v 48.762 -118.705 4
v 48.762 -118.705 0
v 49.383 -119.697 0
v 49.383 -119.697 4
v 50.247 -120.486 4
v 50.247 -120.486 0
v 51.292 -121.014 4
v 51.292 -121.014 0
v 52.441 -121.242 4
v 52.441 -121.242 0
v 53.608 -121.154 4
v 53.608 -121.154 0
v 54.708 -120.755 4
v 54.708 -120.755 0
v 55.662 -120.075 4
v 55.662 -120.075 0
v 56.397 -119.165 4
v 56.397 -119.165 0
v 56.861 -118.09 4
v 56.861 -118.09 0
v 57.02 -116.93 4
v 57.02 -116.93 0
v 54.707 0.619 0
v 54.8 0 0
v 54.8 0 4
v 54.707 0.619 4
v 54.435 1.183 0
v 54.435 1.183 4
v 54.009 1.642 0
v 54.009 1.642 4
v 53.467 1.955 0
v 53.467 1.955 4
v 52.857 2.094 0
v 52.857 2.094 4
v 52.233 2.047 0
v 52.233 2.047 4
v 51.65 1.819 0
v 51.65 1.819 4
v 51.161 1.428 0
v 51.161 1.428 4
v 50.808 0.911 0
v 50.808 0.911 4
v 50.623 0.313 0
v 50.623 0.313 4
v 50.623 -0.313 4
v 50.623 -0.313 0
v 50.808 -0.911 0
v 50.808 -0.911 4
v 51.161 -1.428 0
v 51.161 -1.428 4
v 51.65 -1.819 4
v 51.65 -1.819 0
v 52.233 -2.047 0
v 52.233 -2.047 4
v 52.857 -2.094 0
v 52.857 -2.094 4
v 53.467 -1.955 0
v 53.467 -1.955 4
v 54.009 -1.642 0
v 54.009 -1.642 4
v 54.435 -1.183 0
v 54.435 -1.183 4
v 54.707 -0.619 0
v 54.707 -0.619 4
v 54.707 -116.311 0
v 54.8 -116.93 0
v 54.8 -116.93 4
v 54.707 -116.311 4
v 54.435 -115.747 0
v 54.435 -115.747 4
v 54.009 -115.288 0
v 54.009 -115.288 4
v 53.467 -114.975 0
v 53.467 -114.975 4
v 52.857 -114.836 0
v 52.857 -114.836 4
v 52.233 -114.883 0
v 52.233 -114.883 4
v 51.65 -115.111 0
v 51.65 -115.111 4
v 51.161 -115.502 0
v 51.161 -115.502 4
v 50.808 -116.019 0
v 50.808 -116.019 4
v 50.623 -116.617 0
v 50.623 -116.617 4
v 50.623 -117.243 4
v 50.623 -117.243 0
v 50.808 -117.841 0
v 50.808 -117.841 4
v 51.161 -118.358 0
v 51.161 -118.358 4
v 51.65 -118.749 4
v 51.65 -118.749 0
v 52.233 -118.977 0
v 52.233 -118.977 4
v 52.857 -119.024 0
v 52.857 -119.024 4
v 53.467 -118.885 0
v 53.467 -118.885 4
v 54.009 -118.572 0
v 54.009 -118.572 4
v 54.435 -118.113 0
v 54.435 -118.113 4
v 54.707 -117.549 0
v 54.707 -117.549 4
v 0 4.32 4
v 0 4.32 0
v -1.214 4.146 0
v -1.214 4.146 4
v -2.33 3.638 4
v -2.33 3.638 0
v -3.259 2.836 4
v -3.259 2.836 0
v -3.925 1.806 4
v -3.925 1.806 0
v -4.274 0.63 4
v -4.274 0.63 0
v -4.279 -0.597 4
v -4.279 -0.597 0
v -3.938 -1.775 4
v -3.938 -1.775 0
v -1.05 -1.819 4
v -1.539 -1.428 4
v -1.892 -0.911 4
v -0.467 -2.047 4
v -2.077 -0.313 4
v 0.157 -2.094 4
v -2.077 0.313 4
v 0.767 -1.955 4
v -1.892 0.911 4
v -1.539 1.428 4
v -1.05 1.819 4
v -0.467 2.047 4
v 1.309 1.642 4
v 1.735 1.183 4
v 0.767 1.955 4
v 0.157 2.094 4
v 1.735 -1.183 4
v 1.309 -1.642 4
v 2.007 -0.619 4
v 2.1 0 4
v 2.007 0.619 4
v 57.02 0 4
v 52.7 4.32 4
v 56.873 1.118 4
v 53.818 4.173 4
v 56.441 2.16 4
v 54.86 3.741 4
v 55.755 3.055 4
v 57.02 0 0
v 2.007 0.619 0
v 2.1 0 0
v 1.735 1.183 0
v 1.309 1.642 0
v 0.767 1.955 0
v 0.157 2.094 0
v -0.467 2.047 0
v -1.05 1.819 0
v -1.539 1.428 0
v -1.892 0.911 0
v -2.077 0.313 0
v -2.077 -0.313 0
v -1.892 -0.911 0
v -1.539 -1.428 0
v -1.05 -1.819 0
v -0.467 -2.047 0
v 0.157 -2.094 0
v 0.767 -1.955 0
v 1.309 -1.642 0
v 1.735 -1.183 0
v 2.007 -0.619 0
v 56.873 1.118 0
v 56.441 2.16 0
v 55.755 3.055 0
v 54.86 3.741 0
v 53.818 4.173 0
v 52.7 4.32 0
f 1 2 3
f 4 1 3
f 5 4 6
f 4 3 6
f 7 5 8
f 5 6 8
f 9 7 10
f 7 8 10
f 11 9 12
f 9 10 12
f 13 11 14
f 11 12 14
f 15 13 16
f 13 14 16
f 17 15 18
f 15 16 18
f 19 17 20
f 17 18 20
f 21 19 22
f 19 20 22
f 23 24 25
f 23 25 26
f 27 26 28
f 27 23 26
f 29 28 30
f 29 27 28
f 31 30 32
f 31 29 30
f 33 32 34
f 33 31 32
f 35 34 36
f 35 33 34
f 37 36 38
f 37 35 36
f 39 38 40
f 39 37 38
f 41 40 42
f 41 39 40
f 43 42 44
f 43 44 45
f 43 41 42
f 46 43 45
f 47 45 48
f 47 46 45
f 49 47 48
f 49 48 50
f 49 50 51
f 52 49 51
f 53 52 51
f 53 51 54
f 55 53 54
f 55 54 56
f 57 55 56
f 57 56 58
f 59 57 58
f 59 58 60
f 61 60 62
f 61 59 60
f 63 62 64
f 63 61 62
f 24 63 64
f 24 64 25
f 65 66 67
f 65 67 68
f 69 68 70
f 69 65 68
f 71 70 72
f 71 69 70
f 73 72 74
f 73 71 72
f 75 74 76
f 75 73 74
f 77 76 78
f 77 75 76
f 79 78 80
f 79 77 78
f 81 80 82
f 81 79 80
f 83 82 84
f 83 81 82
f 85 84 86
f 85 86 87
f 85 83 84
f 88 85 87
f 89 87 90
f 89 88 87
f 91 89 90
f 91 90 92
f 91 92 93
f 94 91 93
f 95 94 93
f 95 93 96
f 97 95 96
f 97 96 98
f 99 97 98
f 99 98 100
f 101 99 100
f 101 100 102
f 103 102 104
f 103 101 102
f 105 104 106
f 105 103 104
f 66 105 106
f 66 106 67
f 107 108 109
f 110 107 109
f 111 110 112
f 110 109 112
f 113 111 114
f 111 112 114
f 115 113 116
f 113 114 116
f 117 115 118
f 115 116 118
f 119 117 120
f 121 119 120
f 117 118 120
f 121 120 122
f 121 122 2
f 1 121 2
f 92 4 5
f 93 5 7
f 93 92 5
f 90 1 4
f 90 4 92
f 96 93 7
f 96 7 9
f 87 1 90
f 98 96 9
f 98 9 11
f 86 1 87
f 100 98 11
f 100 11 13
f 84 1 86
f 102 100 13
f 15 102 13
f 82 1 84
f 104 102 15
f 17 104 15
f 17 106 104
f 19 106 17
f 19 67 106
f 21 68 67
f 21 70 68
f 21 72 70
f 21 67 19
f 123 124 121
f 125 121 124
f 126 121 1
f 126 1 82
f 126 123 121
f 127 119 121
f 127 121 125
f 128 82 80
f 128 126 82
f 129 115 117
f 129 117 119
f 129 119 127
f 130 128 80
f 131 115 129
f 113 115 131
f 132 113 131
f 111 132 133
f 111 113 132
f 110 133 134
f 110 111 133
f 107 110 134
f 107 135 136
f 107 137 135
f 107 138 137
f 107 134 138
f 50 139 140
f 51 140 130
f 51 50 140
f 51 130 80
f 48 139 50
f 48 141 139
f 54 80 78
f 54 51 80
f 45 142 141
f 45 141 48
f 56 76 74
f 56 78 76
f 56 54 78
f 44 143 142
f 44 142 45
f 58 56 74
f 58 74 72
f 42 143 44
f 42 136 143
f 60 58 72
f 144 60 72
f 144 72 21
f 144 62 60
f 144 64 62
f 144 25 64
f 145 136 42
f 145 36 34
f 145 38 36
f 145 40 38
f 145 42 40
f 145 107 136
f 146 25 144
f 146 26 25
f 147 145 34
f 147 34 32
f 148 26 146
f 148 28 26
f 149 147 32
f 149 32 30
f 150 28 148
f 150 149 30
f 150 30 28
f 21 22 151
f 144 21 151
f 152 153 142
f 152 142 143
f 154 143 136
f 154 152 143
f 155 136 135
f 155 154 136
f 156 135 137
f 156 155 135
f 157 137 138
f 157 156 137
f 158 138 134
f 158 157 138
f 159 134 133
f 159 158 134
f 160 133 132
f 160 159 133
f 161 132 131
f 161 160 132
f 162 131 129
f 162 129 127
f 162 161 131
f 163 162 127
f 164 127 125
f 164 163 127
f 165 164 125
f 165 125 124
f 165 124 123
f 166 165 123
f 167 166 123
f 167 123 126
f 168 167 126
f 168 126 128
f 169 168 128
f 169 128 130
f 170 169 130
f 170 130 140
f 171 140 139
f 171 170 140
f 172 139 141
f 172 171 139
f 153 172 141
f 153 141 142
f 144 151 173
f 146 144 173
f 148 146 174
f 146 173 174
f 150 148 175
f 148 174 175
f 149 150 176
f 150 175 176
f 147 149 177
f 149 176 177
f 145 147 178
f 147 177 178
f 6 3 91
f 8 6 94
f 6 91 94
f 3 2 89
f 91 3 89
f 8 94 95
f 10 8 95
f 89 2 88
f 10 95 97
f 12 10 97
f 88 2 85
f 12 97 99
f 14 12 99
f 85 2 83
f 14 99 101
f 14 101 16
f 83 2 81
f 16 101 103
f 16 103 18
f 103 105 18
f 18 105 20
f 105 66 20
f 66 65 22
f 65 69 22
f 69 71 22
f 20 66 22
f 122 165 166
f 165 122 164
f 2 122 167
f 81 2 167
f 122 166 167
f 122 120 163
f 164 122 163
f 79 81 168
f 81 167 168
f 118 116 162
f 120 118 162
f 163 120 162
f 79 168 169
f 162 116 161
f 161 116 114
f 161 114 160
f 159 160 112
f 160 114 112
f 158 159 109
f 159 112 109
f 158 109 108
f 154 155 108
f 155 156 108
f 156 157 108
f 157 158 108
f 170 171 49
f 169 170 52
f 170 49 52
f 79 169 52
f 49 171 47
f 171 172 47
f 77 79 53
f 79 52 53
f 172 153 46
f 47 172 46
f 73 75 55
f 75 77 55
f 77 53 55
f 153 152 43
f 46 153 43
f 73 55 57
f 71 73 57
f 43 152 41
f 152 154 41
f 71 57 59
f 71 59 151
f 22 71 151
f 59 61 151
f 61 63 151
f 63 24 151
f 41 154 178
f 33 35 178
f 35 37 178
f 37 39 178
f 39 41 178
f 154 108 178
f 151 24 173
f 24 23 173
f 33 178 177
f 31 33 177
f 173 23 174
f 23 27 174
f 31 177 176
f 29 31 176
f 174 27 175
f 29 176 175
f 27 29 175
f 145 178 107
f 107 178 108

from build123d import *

# Parameters (mm, degrees)
SKETCH1_R           = 4.32
SKETCH1_R_2         = 2.1
BOSS_EXTRUDE1_DEPTH = 4


with BuildPart() as part:
    # Sketch1 → Boss-Extrude1 (new body)
    with BuildSketch(Plane.XY):
        with BuildLine():
            Line((52.7, 4.32), (0, 4.32))
            ThreePointArc((0, 4.32), (3.054701295, 3.054701295), (4.32, 0))
            ThreePointArc((4.32, 0), (0.907798653, -4.223541358), (-3.938472965, -1.775057943))
            Line((-3.938472965, -1.775057943), (48.761527035, -118.705057943))
            ThreePointArc((48.761527035, -118.705057943), (51.792201347, -112.706458642), (57.02, -116.93))
            Line((57.02, -116.93), (57.02, 0))
            ThreePointArc((57.02, 0), (49.645298705, -3.054701295), (52.7, 4.32))
        make_face()
        Circle(SKETCH1_R)
        Circle(SKETCH1_R_2, mode=Mode.SUBTRACT)
        with Locations((52.7, 0)):
            Circle(SKETCH1_R)
        with Locations((52.7, 0)):
            Circle(SKETCH1_R_2, mode=Mode.SUBTRACT)
        with Locations((52.7, -116.93)):
            Circle(SKETCH1_R)
        with Locations((52.7, -116.93)):
            Circle(SKETCH1_R_2, mode=Mode.SUBTRACT)
    extrude(amount=BOSS_EXTRUDE1_DEPTH)


solid = part.part
